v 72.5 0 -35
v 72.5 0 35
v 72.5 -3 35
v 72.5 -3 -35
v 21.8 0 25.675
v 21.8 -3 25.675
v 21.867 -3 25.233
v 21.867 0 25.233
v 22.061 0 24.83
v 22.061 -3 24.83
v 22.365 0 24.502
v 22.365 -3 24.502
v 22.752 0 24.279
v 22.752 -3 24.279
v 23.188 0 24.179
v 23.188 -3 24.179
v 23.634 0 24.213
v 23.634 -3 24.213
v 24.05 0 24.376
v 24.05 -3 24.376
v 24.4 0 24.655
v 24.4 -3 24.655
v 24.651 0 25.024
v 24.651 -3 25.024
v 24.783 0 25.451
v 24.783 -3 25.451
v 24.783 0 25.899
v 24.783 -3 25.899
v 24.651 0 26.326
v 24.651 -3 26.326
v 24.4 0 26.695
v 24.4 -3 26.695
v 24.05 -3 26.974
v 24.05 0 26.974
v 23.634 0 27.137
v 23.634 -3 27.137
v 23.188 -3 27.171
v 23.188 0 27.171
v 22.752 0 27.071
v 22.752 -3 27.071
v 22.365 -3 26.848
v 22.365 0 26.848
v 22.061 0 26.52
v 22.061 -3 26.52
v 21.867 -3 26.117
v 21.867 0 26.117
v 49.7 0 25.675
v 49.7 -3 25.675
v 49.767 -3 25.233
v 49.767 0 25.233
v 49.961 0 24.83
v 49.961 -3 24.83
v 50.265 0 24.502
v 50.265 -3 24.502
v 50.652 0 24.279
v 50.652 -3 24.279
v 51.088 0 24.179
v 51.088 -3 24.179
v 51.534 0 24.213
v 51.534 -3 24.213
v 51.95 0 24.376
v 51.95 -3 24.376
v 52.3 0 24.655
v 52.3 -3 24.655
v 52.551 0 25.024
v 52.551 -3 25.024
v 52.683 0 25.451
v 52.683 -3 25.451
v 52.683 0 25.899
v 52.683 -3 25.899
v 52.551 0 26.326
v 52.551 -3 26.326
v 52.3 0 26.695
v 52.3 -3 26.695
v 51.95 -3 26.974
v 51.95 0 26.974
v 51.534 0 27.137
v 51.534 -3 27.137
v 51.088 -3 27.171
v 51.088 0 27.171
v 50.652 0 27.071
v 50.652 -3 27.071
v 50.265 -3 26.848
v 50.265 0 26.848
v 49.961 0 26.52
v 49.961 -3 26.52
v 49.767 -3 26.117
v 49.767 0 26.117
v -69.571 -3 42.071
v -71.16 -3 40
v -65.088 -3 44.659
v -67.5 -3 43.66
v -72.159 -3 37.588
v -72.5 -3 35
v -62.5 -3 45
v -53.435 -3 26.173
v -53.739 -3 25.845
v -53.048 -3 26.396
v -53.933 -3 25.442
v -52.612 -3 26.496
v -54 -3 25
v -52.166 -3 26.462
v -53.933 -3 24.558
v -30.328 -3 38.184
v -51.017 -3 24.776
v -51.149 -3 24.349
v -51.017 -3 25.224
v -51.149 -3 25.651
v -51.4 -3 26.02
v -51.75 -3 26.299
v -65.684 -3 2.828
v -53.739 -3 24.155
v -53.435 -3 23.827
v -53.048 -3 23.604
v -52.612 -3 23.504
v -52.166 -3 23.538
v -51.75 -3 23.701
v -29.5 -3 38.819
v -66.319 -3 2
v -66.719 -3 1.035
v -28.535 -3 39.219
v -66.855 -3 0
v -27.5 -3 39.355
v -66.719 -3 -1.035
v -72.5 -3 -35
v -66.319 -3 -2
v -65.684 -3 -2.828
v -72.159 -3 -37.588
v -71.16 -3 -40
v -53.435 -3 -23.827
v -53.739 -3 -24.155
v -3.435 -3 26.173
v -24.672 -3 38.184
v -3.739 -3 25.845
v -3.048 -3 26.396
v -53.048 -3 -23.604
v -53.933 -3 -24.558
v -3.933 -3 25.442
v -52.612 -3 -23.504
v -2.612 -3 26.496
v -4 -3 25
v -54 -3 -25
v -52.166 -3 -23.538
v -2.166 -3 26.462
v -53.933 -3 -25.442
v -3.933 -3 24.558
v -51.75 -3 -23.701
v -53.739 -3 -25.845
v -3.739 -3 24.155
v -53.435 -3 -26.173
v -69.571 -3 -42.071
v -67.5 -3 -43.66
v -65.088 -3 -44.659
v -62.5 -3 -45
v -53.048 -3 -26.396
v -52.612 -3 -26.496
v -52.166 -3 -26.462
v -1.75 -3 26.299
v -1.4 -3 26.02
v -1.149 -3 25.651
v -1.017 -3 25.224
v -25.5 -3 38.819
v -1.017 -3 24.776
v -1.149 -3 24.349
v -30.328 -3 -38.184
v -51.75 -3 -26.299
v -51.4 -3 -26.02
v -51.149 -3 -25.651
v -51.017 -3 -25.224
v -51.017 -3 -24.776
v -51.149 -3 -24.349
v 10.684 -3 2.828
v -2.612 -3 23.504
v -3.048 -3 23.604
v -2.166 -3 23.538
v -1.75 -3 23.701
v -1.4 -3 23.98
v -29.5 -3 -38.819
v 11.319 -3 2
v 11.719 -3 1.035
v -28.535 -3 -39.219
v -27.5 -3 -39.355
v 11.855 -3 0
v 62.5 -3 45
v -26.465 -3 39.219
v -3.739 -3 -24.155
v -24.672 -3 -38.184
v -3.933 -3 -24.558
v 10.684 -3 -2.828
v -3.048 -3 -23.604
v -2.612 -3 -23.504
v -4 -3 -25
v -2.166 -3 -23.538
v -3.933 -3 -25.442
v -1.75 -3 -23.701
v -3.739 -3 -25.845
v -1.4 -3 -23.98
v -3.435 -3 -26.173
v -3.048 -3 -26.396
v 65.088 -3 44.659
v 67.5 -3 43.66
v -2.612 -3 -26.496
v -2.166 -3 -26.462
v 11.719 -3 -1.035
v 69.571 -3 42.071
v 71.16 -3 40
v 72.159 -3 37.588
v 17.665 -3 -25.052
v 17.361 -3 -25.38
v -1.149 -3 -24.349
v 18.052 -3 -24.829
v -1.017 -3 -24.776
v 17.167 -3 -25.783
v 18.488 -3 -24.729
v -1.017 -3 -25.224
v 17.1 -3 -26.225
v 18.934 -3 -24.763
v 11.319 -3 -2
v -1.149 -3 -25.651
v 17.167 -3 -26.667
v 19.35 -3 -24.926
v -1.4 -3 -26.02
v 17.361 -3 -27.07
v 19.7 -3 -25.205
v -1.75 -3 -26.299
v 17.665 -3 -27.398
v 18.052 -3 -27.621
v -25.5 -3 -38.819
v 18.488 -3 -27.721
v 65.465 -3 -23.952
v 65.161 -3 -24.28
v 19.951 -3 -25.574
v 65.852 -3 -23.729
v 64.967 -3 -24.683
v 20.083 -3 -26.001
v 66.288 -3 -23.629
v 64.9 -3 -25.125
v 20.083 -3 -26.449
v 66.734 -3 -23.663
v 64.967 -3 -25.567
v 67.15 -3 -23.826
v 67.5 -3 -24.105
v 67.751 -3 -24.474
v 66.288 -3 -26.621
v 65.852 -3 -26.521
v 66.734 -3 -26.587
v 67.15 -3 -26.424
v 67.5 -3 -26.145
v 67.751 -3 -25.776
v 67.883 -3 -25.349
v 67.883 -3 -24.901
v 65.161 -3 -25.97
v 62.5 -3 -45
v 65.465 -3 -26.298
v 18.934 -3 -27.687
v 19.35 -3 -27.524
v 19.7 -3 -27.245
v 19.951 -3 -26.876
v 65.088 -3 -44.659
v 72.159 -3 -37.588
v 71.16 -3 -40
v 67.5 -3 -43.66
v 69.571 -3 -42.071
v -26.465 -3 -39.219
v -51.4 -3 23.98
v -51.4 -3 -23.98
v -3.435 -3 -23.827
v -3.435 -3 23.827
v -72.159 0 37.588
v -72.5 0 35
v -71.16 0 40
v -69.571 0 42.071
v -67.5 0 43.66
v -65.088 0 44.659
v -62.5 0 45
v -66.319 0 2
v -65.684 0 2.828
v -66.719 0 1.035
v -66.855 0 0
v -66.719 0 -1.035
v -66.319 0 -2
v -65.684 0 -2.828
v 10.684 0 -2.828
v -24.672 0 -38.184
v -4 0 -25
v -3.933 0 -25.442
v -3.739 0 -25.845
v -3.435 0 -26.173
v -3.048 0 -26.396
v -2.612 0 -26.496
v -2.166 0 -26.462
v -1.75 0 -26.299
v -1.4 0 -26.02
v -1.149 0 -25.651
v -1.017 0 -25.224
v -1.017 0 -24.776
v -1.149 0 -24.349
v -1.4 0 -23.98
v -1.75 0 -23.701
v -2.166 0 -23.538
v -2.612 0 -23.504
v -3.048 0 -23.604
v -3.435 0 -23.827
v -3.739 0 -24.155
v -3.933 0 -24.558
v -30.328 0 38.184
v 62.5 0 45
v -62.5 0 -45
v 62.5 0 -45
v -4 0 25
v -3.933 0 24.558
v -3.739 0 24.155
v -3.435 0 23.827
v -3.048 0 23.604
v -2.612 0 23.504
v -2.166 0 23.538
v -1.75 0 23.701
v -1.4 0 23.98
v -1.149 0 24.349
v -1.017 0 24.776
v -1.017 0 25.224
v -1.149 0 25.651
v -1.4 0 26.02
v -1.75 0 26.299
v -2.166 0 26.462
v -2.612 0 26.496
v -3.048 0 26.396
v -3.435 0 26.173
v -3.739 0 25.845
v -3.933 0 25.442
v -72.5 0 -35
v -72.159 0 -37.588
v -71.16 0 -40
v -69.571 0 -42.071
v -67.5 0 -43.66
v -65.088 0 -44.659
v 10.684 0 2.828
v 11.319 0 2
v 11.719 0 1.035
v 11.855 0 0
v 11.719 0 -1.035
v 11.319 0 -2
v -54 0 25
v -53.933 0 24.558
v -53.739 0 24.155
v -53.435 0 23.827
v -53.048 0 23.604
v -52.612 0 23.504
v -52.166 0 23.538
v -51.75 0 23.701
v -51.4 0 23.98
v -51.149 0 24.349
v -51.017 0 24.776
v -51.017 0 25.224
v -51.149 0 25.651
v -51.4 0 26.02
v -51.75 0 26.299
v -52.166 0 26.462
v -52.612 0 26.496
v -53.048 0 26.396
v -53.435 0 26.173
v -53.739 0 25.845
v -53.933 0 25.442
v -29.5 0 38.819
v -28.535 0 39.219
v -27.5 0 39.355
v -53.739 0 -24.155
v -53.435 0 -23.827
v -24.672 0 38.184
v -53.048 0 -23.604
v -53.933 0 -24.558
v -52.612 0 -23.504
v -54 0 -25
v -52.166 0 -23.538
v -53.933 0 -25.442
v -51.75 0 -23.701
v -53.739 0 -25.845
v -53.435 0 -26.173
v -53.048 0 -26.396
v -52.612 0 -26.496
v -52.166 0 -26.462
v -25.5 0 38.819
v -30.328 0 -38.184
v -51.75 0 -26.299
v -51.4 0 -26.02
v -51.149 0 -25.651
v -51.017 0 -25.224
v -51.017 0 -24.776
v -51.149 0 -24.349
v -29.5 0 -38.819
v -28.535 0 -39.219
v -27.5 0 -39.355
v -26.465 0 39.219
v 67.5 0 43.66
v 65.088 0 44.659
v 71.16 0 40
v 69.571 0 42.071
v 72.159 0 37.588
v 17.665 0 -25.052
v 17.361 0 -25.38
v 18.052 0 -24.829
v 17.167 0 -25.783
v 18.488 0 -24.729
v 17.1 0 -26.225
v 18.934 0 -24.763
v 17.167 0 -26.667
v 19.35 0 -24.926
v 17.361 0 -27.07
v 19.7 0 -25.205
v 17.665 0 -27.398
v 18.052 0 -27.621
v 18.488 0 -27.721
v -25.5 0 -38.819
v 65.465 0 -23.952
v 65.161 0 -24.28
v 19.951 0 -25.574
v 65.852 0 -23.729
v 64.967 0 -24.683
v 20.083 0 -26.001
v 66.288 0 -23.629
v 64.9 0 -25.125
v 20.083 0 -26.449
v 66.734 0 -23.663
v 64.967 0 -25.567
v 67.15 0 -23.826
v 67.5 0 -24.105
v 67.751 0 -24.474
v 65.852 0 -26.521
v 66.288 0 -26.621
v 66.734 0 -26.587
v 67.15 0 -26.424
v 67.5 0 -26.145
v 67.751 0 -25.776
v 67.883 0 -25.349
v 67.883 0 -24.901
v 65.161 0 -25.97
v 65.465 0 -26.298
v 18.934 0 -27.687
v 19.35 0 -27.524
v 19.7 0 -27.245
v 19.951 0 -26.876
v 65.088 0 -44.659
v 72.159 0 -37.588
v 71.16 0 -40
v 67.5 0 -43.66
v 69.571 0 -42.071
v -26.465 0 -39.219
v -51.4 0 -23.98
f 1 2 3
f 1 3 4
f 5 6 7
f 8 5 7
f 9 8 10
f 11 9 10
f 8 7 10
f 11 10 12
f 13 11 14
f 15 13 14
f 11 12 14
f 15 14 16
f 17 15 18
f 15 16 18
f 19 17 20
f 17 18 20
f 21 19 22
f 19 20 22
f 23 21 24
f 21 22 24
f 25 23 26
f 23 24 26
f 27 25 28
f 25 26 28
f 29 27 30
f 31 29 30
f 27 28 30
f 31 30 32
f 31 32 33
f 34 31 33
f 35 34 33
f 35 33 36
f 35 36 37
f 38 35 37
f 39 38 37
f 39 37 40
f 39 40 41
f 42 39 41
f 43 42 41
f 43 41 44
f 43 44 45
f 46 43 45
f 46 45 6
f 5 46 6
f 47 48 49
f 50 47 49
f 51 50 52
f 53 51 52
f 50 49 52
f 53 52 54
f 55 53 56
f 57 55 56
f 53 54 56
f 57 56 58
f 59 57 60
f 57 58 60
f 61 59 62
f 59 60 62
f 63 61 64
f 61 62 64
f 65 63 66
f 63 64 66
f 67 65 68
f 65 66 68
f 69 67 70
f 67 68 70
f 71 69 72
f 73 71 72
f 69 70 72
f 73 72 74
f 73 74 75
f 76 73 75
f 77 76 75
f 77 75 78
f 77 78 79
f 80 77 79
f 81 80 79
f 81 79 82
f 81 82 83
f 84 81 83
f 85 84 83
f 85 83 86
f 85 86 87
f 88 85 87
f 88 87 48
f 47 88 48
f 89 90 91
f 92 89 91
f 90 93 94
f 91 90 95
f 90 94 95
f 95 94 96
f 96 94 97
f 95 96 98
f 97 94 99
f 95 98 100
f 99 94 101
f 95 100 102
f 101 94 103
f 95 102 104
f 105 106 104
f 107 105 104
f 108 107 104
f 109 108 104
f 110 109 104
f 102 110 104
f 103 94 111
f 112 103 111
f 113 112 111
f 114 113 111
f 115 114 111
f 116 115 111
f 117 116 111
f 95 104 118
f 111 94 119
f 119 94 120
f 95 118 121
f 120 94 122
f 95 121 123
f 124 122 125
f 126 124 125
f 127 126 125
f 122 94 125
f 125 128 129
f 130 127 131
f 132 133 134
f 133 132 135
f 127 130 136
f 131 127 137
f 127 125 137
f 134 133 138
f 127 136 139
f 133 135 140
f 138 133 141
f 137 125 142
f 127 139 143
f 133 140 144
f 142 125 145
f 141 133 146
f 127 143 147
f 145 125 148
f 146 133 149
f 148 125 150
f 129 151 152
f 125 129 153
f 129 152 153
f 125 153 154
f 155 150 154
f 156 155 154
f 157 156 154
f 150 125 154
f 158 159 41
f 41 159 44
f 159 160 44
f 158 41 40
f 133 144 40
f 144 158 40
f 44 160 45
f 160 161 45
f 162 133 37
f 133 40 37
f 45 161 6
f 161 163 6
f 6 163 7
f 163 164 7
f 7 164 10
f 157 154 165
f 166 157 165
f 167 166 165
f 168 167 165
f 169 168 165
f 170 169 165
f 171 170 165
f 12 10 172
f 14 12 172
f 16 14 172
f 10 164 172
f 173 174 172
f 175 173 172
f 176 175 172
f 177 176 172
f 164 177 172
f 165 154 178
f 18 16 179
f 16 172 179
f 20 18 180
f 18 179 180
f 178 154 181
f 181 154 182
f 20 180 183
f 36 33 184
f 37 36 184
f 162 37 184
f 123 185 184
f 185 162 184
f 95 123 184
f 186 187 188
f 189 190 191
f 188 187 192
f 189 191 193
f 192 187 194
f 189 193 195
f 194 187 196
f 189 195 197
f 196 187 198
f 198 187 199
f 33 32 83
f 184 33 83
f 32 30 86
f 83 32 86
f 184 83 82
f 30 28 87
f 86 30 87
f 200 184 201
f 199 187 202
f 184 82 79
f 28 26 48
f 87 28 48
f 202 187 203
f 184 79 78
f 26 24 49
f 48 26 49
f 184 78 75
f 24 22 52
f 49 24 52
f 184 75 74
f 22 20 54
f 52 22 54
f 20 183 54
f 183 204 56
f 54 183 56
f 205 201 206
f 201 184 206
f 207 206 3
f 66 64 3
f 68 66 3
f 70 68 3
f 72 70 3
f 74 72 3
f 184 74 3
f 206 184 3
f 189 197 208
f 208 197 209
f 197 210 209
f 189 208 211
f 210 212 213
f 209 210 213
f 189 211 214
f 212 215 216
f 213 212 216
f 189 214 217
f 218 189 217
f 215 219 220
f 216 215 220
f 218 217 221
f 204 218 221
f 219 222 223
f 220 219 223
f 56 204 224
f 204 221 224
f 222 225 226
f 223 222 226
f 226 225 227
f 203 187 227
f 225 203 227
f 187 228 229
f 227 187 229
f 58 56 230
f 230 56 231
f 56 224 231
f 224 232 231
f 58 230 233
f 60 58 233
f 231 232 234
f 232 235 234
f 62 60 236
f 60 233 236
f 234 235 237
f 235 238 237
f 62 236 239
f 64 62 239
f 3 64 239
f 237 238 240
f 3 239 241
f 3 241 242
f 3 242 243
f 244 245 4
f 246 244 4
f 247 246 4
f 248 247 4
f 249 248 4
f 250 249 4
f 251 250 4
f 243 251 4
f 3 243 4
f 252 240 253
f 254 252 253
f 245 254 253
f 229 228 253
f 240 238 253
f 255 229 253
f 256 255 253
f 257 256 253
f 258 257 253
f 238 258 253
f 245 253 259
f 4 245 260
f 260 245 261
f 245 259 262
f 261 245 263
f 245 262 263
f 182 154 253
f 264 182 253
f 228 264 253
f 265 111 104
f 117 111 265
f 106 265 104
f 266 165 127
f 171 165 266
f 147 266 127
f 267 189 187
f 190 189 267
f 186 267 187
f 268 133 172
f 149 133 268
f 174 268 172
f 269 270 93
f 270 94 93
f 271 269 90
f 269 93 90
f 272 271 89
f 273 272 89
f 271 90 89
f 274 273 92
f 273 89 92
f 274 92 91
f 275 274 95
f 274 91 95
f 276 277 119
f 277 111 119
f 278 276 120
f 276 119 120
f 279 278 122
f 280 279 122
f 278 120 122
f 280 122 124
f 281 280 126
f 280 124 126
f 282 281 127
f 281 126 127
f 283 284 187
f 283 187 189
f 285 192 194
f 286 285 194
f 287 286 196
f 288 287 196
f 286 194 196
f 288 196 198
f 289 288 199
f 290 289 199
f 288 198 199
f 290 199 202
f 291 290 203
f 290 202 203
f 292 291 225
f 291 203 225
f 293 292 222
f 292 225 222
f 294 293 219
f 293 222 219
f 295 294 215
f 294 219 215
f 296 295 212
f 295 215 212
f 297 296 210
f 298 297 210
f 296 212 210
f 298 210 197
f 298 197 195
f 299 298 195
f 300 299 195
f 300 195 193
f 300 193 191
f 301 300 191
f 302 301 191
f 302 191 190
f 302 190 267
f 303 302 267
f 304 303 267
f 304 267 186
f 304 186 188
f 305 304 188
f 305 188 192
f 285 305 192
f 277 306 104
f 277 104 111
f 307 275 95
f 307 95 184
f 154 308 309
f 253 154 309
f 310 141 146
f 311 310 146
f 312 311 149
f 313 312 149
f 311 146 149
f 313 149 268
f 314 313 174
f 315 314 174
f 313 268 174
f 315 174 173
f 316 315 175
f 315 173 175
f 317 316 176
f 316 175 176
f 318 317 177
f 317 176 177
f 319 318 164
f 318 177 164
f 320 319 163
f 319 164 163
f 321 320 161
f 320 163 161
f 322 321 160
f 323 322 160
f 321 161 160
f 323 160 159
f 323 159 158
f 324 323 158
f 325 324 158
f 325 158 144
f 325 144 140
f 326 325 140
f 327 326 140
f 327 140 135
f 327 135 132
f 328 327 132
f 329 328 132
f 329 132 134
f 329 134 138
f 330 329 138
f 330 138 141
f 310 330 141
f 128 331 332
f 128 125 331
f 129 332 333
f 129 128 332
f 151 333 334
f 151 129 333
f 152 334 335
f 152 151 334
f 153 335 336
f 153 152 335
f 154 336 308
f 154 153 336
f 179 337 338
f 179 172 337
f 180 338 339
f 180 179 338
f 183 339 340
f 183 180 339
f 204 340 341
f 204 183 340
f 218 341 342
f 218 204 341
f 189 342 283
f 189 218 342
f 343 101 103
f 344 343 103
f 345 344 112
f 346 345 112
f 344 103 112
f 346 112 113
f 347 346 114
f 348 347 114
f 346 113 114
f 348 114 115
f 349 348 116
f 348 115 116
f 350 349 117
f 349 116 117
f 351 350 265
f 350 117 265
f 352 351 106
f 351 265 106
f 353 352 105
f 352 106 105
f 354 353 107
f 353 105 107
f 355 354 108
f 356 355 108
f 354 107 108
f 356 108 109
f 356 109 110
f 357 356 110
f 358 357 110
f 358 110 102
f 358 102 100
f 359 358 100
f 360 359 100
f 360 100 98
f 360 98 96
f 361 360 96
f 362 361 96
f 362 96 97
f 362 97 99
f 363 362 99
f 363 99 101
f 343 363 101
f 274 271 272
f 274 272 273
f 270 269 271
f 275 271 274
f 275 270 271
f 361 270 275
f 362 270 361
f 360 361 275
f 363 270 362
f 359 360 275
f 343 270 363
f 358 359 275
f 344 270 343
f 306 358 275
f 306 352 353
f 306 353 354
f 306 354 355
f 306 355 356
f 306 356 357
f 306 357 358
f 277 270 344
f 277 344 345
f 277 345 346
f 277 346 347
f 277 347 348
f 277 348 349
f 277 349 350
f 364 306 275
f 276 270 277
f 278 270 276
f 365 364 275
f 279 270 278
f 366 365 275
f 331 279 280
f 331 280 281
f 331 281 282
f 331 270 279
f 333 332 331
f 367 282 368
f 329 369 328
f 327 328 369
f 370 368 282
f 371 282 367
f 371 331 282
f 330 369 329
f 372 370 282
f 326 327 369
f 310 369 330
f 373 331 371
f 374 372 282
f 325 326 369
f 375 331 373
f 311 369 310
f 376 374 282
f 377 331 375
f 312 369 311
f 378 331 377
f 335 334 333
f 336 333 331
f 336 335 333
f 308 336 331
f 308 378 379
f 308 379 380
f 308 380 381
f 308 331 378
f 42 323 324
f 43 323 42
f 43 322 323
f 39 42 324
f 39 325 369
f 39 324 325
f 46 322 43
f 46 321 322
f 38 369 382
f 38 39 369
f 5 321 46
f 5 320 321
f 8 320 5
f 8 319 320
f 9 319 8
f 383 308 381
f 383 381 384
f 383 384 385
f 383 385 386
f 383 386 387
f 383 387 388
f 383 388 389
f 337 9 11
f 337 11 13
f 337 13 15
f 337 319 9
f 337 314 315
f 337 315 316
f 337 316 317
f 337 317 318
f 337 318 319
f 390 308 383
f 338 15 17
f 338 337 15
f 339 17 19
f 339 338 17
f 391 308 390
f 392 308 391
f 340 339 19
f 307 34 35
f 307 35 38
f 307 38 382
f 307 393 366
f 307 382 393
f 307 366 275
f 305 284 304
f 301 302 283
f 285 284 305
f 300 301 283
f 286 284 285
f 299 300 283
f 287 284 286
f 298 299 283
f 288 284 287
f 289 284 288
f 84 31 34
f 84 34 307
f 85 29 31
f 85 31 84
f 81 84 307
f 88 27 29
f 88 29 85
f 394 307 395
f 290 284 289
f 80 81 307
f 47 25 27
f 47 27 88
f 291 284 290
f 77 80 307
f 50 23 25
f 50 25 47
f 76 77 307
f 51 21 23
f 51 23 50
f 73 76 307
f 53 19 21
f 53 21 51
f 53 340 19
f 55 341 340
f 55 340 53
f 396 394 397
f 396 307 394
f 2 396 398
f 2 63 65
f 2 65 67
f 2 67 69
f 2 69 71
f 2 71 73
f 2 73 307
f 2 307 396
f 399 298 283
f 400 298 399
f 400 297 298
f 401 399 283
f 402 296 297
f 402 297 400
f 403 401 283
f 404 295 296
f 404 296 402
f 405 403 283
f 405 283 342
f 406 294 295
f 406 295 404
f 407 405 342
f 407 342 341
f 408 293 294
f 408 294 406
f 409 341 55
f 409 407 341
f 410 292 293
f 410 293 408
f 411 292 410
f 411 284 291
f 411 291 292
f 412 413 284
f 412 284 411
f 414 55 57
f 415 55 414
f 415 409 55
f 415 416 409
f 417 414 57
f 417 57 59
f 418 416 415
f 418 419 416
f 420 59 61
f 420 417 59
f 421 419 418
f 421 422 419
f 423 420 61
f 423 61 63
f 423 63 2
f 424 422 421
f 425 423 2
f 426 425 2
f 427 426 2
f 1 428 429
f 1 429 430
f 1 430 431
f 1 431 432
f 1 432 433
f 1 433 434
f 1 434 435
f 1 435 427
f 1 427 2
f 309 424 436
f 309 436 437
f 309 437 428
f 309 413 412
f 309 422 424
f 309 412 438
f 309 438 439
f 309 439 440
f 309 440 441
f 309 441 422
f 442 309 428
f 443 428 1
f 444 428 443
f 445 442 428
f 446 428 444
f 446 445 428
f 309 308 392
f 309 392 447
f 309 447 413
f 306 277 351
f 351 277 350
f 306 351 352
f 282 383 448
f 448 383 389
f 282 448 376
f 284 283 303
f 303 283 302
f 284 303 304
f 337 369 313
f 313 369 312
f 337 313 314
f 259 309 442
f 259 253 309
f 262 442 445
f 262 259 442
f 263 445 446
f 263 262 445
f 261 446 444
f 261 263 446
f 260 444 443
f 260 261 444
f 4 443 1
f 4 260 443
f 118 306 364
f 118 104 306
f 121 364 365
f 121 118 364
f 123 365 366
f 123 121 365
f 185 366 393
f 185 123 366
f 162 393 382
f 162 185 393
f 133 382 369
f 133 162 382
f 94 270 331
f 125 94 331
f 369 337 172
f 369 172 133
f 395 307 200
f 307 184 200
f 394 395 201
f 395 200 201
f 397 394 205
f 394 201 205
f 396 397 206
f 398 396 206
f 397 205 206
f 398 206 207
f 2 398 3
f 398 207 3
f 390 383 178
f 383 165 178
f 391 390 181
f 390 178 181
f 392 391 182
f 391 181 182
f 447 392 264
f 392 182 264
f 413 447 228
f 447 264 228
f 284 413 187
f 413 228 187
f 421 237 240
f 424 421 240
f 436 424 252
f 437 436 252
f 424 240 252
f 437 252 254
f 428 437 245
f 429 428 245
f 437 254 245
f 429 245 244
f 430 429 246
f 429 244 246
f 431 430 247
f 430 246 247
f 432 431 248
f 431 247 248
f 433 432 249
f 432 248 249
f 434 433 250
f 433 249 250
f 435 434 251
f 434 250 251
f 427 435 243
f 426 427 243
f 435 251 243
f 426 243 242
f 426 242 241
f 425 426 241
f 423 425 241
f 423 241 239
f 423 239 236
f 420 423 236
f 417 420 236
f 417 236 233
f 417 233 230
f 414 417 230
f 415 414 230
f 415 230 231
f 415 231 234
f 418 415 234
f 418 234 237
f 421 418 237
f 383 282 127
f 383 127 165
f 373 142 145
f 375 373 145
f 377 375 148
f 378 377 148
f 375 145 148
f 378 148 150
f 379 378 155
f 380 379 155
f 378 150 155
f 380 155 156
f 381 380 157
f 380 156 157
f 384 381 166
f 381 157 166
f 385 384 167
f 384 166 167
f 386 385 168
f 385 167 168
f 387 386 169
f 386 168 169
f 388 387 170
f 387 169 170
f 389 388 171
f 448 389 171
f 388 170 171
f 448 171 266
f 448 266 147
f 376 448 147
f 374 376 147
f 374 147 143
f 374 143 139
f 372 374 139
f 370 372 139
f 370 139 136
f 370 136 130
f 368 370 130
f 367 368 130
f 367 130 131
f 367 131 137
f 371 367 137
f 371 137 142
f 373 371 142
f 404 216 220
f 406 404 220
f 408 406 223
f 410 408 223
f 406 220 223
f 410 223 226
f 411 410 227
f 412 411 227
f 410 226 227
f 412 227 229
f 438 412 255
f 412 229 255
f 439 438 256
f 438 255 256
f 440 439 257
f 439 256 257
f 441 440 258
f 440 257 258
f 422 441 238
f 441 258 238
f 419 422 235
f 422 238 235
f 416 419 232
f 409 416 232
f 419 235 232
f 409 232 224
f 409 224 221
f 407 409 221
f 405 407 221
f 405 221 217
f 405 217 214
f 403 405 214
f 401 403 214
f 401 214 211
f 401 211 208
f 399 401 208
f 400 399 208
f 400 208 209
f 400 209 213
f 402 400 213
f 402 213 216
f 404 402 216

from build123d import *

# Parameters (mm, degrees)
BASE_W                     = 145
BASE_H                     = 90
RESSALTO_EXTRUS_O1_DEPTH   = 3
CORTE_EXTRUS_O1_DEPTH      = 86.382960829
FURO_DE_DI_METRO_3_0_3_1_D = 3
FURO_DE_DI_METRO_3_0_3_7_D = 3
FILETE1_R                  = 10
FILETE2_R                  = 4


with BuildPart() as part:
    # Base → Ressalto-extrusão1 (new body)
    with BuildSketch(Plane(origin=(0, 0, 0), x_dir=(1, 0, 0), z_dir=(0, 1, 0))):
        Rectangle(BASE_W, BASE_H)
    extrude(amount=-RESSALTO_EXTRUS_O1_DEPTH)

    # Recorte → Corte-extrusão1 (cut, through all)
    with BuildSketch(Plane(origin=(0, 0, 0), x_dir=(1, 0, 0), z_dir=(0, 1, 0))):
        Polygon((-68.512193309, 0), (-27.5, 41.012193309), (13.512193309, 0), (-27.5, -41.012193309), align=None)
    extrude(amount=-CORTE_EXTRUS_O1_DEPTH, mode=Mode.SUBTRACT)

    # Furo de diâmetro Ø3.0 (3)1 (through all)
    with Locations(Plane(origin=(0, 0, 0), x_dir=(1, 0, 0), z_dir=(0, 1, 0))):
        with Locations((-52.5, 25), (-2.5, 25), (-2.5, -25), (-52.5, -25)):
            Hole(FURO_DE_DI_METRO_3_0_3_1_D / 2)

    # Furo de diâmetro Ø3.0 (3)7 (through all)
    with Locations(Plane(origin=(0, 0, 0), x_dir=(1, 0, 0), z_dir=(0, 1, 0))):
        with Locations((18.6, 26.225), (23.3, -25.675), (51.2, -25.675), (66.4, 25.125)):
            Hole(FURO_DE_DI_METRO_3_0_3_7_D / 2)

    # Filete1
    filete1_edges = [part.edges().sort_by_distance(p)[0] for p in [
        (72.5, -1.5, 45),
        (-72.5, -1.5, 45),
        (-72.5, -1.5, -45),
        (72.5, -1.5, -45),
    ]]
    fillet(filete1_edges, radius=FILETE1_R)

    # Filete2
    filete2_edges = [part.edges().sort_by_distance(p)[0] for p in [
        (-68.512193309, -1.5, 0),
        (-27.5, -1.5, -41.012193309),
        (13.512193309, -1.5, 0),
        (-27.5, -1.5, 41.012193309),
    ]]
    fillet(filete2_edges, radius=FILETE2_R)


solid = part.part
